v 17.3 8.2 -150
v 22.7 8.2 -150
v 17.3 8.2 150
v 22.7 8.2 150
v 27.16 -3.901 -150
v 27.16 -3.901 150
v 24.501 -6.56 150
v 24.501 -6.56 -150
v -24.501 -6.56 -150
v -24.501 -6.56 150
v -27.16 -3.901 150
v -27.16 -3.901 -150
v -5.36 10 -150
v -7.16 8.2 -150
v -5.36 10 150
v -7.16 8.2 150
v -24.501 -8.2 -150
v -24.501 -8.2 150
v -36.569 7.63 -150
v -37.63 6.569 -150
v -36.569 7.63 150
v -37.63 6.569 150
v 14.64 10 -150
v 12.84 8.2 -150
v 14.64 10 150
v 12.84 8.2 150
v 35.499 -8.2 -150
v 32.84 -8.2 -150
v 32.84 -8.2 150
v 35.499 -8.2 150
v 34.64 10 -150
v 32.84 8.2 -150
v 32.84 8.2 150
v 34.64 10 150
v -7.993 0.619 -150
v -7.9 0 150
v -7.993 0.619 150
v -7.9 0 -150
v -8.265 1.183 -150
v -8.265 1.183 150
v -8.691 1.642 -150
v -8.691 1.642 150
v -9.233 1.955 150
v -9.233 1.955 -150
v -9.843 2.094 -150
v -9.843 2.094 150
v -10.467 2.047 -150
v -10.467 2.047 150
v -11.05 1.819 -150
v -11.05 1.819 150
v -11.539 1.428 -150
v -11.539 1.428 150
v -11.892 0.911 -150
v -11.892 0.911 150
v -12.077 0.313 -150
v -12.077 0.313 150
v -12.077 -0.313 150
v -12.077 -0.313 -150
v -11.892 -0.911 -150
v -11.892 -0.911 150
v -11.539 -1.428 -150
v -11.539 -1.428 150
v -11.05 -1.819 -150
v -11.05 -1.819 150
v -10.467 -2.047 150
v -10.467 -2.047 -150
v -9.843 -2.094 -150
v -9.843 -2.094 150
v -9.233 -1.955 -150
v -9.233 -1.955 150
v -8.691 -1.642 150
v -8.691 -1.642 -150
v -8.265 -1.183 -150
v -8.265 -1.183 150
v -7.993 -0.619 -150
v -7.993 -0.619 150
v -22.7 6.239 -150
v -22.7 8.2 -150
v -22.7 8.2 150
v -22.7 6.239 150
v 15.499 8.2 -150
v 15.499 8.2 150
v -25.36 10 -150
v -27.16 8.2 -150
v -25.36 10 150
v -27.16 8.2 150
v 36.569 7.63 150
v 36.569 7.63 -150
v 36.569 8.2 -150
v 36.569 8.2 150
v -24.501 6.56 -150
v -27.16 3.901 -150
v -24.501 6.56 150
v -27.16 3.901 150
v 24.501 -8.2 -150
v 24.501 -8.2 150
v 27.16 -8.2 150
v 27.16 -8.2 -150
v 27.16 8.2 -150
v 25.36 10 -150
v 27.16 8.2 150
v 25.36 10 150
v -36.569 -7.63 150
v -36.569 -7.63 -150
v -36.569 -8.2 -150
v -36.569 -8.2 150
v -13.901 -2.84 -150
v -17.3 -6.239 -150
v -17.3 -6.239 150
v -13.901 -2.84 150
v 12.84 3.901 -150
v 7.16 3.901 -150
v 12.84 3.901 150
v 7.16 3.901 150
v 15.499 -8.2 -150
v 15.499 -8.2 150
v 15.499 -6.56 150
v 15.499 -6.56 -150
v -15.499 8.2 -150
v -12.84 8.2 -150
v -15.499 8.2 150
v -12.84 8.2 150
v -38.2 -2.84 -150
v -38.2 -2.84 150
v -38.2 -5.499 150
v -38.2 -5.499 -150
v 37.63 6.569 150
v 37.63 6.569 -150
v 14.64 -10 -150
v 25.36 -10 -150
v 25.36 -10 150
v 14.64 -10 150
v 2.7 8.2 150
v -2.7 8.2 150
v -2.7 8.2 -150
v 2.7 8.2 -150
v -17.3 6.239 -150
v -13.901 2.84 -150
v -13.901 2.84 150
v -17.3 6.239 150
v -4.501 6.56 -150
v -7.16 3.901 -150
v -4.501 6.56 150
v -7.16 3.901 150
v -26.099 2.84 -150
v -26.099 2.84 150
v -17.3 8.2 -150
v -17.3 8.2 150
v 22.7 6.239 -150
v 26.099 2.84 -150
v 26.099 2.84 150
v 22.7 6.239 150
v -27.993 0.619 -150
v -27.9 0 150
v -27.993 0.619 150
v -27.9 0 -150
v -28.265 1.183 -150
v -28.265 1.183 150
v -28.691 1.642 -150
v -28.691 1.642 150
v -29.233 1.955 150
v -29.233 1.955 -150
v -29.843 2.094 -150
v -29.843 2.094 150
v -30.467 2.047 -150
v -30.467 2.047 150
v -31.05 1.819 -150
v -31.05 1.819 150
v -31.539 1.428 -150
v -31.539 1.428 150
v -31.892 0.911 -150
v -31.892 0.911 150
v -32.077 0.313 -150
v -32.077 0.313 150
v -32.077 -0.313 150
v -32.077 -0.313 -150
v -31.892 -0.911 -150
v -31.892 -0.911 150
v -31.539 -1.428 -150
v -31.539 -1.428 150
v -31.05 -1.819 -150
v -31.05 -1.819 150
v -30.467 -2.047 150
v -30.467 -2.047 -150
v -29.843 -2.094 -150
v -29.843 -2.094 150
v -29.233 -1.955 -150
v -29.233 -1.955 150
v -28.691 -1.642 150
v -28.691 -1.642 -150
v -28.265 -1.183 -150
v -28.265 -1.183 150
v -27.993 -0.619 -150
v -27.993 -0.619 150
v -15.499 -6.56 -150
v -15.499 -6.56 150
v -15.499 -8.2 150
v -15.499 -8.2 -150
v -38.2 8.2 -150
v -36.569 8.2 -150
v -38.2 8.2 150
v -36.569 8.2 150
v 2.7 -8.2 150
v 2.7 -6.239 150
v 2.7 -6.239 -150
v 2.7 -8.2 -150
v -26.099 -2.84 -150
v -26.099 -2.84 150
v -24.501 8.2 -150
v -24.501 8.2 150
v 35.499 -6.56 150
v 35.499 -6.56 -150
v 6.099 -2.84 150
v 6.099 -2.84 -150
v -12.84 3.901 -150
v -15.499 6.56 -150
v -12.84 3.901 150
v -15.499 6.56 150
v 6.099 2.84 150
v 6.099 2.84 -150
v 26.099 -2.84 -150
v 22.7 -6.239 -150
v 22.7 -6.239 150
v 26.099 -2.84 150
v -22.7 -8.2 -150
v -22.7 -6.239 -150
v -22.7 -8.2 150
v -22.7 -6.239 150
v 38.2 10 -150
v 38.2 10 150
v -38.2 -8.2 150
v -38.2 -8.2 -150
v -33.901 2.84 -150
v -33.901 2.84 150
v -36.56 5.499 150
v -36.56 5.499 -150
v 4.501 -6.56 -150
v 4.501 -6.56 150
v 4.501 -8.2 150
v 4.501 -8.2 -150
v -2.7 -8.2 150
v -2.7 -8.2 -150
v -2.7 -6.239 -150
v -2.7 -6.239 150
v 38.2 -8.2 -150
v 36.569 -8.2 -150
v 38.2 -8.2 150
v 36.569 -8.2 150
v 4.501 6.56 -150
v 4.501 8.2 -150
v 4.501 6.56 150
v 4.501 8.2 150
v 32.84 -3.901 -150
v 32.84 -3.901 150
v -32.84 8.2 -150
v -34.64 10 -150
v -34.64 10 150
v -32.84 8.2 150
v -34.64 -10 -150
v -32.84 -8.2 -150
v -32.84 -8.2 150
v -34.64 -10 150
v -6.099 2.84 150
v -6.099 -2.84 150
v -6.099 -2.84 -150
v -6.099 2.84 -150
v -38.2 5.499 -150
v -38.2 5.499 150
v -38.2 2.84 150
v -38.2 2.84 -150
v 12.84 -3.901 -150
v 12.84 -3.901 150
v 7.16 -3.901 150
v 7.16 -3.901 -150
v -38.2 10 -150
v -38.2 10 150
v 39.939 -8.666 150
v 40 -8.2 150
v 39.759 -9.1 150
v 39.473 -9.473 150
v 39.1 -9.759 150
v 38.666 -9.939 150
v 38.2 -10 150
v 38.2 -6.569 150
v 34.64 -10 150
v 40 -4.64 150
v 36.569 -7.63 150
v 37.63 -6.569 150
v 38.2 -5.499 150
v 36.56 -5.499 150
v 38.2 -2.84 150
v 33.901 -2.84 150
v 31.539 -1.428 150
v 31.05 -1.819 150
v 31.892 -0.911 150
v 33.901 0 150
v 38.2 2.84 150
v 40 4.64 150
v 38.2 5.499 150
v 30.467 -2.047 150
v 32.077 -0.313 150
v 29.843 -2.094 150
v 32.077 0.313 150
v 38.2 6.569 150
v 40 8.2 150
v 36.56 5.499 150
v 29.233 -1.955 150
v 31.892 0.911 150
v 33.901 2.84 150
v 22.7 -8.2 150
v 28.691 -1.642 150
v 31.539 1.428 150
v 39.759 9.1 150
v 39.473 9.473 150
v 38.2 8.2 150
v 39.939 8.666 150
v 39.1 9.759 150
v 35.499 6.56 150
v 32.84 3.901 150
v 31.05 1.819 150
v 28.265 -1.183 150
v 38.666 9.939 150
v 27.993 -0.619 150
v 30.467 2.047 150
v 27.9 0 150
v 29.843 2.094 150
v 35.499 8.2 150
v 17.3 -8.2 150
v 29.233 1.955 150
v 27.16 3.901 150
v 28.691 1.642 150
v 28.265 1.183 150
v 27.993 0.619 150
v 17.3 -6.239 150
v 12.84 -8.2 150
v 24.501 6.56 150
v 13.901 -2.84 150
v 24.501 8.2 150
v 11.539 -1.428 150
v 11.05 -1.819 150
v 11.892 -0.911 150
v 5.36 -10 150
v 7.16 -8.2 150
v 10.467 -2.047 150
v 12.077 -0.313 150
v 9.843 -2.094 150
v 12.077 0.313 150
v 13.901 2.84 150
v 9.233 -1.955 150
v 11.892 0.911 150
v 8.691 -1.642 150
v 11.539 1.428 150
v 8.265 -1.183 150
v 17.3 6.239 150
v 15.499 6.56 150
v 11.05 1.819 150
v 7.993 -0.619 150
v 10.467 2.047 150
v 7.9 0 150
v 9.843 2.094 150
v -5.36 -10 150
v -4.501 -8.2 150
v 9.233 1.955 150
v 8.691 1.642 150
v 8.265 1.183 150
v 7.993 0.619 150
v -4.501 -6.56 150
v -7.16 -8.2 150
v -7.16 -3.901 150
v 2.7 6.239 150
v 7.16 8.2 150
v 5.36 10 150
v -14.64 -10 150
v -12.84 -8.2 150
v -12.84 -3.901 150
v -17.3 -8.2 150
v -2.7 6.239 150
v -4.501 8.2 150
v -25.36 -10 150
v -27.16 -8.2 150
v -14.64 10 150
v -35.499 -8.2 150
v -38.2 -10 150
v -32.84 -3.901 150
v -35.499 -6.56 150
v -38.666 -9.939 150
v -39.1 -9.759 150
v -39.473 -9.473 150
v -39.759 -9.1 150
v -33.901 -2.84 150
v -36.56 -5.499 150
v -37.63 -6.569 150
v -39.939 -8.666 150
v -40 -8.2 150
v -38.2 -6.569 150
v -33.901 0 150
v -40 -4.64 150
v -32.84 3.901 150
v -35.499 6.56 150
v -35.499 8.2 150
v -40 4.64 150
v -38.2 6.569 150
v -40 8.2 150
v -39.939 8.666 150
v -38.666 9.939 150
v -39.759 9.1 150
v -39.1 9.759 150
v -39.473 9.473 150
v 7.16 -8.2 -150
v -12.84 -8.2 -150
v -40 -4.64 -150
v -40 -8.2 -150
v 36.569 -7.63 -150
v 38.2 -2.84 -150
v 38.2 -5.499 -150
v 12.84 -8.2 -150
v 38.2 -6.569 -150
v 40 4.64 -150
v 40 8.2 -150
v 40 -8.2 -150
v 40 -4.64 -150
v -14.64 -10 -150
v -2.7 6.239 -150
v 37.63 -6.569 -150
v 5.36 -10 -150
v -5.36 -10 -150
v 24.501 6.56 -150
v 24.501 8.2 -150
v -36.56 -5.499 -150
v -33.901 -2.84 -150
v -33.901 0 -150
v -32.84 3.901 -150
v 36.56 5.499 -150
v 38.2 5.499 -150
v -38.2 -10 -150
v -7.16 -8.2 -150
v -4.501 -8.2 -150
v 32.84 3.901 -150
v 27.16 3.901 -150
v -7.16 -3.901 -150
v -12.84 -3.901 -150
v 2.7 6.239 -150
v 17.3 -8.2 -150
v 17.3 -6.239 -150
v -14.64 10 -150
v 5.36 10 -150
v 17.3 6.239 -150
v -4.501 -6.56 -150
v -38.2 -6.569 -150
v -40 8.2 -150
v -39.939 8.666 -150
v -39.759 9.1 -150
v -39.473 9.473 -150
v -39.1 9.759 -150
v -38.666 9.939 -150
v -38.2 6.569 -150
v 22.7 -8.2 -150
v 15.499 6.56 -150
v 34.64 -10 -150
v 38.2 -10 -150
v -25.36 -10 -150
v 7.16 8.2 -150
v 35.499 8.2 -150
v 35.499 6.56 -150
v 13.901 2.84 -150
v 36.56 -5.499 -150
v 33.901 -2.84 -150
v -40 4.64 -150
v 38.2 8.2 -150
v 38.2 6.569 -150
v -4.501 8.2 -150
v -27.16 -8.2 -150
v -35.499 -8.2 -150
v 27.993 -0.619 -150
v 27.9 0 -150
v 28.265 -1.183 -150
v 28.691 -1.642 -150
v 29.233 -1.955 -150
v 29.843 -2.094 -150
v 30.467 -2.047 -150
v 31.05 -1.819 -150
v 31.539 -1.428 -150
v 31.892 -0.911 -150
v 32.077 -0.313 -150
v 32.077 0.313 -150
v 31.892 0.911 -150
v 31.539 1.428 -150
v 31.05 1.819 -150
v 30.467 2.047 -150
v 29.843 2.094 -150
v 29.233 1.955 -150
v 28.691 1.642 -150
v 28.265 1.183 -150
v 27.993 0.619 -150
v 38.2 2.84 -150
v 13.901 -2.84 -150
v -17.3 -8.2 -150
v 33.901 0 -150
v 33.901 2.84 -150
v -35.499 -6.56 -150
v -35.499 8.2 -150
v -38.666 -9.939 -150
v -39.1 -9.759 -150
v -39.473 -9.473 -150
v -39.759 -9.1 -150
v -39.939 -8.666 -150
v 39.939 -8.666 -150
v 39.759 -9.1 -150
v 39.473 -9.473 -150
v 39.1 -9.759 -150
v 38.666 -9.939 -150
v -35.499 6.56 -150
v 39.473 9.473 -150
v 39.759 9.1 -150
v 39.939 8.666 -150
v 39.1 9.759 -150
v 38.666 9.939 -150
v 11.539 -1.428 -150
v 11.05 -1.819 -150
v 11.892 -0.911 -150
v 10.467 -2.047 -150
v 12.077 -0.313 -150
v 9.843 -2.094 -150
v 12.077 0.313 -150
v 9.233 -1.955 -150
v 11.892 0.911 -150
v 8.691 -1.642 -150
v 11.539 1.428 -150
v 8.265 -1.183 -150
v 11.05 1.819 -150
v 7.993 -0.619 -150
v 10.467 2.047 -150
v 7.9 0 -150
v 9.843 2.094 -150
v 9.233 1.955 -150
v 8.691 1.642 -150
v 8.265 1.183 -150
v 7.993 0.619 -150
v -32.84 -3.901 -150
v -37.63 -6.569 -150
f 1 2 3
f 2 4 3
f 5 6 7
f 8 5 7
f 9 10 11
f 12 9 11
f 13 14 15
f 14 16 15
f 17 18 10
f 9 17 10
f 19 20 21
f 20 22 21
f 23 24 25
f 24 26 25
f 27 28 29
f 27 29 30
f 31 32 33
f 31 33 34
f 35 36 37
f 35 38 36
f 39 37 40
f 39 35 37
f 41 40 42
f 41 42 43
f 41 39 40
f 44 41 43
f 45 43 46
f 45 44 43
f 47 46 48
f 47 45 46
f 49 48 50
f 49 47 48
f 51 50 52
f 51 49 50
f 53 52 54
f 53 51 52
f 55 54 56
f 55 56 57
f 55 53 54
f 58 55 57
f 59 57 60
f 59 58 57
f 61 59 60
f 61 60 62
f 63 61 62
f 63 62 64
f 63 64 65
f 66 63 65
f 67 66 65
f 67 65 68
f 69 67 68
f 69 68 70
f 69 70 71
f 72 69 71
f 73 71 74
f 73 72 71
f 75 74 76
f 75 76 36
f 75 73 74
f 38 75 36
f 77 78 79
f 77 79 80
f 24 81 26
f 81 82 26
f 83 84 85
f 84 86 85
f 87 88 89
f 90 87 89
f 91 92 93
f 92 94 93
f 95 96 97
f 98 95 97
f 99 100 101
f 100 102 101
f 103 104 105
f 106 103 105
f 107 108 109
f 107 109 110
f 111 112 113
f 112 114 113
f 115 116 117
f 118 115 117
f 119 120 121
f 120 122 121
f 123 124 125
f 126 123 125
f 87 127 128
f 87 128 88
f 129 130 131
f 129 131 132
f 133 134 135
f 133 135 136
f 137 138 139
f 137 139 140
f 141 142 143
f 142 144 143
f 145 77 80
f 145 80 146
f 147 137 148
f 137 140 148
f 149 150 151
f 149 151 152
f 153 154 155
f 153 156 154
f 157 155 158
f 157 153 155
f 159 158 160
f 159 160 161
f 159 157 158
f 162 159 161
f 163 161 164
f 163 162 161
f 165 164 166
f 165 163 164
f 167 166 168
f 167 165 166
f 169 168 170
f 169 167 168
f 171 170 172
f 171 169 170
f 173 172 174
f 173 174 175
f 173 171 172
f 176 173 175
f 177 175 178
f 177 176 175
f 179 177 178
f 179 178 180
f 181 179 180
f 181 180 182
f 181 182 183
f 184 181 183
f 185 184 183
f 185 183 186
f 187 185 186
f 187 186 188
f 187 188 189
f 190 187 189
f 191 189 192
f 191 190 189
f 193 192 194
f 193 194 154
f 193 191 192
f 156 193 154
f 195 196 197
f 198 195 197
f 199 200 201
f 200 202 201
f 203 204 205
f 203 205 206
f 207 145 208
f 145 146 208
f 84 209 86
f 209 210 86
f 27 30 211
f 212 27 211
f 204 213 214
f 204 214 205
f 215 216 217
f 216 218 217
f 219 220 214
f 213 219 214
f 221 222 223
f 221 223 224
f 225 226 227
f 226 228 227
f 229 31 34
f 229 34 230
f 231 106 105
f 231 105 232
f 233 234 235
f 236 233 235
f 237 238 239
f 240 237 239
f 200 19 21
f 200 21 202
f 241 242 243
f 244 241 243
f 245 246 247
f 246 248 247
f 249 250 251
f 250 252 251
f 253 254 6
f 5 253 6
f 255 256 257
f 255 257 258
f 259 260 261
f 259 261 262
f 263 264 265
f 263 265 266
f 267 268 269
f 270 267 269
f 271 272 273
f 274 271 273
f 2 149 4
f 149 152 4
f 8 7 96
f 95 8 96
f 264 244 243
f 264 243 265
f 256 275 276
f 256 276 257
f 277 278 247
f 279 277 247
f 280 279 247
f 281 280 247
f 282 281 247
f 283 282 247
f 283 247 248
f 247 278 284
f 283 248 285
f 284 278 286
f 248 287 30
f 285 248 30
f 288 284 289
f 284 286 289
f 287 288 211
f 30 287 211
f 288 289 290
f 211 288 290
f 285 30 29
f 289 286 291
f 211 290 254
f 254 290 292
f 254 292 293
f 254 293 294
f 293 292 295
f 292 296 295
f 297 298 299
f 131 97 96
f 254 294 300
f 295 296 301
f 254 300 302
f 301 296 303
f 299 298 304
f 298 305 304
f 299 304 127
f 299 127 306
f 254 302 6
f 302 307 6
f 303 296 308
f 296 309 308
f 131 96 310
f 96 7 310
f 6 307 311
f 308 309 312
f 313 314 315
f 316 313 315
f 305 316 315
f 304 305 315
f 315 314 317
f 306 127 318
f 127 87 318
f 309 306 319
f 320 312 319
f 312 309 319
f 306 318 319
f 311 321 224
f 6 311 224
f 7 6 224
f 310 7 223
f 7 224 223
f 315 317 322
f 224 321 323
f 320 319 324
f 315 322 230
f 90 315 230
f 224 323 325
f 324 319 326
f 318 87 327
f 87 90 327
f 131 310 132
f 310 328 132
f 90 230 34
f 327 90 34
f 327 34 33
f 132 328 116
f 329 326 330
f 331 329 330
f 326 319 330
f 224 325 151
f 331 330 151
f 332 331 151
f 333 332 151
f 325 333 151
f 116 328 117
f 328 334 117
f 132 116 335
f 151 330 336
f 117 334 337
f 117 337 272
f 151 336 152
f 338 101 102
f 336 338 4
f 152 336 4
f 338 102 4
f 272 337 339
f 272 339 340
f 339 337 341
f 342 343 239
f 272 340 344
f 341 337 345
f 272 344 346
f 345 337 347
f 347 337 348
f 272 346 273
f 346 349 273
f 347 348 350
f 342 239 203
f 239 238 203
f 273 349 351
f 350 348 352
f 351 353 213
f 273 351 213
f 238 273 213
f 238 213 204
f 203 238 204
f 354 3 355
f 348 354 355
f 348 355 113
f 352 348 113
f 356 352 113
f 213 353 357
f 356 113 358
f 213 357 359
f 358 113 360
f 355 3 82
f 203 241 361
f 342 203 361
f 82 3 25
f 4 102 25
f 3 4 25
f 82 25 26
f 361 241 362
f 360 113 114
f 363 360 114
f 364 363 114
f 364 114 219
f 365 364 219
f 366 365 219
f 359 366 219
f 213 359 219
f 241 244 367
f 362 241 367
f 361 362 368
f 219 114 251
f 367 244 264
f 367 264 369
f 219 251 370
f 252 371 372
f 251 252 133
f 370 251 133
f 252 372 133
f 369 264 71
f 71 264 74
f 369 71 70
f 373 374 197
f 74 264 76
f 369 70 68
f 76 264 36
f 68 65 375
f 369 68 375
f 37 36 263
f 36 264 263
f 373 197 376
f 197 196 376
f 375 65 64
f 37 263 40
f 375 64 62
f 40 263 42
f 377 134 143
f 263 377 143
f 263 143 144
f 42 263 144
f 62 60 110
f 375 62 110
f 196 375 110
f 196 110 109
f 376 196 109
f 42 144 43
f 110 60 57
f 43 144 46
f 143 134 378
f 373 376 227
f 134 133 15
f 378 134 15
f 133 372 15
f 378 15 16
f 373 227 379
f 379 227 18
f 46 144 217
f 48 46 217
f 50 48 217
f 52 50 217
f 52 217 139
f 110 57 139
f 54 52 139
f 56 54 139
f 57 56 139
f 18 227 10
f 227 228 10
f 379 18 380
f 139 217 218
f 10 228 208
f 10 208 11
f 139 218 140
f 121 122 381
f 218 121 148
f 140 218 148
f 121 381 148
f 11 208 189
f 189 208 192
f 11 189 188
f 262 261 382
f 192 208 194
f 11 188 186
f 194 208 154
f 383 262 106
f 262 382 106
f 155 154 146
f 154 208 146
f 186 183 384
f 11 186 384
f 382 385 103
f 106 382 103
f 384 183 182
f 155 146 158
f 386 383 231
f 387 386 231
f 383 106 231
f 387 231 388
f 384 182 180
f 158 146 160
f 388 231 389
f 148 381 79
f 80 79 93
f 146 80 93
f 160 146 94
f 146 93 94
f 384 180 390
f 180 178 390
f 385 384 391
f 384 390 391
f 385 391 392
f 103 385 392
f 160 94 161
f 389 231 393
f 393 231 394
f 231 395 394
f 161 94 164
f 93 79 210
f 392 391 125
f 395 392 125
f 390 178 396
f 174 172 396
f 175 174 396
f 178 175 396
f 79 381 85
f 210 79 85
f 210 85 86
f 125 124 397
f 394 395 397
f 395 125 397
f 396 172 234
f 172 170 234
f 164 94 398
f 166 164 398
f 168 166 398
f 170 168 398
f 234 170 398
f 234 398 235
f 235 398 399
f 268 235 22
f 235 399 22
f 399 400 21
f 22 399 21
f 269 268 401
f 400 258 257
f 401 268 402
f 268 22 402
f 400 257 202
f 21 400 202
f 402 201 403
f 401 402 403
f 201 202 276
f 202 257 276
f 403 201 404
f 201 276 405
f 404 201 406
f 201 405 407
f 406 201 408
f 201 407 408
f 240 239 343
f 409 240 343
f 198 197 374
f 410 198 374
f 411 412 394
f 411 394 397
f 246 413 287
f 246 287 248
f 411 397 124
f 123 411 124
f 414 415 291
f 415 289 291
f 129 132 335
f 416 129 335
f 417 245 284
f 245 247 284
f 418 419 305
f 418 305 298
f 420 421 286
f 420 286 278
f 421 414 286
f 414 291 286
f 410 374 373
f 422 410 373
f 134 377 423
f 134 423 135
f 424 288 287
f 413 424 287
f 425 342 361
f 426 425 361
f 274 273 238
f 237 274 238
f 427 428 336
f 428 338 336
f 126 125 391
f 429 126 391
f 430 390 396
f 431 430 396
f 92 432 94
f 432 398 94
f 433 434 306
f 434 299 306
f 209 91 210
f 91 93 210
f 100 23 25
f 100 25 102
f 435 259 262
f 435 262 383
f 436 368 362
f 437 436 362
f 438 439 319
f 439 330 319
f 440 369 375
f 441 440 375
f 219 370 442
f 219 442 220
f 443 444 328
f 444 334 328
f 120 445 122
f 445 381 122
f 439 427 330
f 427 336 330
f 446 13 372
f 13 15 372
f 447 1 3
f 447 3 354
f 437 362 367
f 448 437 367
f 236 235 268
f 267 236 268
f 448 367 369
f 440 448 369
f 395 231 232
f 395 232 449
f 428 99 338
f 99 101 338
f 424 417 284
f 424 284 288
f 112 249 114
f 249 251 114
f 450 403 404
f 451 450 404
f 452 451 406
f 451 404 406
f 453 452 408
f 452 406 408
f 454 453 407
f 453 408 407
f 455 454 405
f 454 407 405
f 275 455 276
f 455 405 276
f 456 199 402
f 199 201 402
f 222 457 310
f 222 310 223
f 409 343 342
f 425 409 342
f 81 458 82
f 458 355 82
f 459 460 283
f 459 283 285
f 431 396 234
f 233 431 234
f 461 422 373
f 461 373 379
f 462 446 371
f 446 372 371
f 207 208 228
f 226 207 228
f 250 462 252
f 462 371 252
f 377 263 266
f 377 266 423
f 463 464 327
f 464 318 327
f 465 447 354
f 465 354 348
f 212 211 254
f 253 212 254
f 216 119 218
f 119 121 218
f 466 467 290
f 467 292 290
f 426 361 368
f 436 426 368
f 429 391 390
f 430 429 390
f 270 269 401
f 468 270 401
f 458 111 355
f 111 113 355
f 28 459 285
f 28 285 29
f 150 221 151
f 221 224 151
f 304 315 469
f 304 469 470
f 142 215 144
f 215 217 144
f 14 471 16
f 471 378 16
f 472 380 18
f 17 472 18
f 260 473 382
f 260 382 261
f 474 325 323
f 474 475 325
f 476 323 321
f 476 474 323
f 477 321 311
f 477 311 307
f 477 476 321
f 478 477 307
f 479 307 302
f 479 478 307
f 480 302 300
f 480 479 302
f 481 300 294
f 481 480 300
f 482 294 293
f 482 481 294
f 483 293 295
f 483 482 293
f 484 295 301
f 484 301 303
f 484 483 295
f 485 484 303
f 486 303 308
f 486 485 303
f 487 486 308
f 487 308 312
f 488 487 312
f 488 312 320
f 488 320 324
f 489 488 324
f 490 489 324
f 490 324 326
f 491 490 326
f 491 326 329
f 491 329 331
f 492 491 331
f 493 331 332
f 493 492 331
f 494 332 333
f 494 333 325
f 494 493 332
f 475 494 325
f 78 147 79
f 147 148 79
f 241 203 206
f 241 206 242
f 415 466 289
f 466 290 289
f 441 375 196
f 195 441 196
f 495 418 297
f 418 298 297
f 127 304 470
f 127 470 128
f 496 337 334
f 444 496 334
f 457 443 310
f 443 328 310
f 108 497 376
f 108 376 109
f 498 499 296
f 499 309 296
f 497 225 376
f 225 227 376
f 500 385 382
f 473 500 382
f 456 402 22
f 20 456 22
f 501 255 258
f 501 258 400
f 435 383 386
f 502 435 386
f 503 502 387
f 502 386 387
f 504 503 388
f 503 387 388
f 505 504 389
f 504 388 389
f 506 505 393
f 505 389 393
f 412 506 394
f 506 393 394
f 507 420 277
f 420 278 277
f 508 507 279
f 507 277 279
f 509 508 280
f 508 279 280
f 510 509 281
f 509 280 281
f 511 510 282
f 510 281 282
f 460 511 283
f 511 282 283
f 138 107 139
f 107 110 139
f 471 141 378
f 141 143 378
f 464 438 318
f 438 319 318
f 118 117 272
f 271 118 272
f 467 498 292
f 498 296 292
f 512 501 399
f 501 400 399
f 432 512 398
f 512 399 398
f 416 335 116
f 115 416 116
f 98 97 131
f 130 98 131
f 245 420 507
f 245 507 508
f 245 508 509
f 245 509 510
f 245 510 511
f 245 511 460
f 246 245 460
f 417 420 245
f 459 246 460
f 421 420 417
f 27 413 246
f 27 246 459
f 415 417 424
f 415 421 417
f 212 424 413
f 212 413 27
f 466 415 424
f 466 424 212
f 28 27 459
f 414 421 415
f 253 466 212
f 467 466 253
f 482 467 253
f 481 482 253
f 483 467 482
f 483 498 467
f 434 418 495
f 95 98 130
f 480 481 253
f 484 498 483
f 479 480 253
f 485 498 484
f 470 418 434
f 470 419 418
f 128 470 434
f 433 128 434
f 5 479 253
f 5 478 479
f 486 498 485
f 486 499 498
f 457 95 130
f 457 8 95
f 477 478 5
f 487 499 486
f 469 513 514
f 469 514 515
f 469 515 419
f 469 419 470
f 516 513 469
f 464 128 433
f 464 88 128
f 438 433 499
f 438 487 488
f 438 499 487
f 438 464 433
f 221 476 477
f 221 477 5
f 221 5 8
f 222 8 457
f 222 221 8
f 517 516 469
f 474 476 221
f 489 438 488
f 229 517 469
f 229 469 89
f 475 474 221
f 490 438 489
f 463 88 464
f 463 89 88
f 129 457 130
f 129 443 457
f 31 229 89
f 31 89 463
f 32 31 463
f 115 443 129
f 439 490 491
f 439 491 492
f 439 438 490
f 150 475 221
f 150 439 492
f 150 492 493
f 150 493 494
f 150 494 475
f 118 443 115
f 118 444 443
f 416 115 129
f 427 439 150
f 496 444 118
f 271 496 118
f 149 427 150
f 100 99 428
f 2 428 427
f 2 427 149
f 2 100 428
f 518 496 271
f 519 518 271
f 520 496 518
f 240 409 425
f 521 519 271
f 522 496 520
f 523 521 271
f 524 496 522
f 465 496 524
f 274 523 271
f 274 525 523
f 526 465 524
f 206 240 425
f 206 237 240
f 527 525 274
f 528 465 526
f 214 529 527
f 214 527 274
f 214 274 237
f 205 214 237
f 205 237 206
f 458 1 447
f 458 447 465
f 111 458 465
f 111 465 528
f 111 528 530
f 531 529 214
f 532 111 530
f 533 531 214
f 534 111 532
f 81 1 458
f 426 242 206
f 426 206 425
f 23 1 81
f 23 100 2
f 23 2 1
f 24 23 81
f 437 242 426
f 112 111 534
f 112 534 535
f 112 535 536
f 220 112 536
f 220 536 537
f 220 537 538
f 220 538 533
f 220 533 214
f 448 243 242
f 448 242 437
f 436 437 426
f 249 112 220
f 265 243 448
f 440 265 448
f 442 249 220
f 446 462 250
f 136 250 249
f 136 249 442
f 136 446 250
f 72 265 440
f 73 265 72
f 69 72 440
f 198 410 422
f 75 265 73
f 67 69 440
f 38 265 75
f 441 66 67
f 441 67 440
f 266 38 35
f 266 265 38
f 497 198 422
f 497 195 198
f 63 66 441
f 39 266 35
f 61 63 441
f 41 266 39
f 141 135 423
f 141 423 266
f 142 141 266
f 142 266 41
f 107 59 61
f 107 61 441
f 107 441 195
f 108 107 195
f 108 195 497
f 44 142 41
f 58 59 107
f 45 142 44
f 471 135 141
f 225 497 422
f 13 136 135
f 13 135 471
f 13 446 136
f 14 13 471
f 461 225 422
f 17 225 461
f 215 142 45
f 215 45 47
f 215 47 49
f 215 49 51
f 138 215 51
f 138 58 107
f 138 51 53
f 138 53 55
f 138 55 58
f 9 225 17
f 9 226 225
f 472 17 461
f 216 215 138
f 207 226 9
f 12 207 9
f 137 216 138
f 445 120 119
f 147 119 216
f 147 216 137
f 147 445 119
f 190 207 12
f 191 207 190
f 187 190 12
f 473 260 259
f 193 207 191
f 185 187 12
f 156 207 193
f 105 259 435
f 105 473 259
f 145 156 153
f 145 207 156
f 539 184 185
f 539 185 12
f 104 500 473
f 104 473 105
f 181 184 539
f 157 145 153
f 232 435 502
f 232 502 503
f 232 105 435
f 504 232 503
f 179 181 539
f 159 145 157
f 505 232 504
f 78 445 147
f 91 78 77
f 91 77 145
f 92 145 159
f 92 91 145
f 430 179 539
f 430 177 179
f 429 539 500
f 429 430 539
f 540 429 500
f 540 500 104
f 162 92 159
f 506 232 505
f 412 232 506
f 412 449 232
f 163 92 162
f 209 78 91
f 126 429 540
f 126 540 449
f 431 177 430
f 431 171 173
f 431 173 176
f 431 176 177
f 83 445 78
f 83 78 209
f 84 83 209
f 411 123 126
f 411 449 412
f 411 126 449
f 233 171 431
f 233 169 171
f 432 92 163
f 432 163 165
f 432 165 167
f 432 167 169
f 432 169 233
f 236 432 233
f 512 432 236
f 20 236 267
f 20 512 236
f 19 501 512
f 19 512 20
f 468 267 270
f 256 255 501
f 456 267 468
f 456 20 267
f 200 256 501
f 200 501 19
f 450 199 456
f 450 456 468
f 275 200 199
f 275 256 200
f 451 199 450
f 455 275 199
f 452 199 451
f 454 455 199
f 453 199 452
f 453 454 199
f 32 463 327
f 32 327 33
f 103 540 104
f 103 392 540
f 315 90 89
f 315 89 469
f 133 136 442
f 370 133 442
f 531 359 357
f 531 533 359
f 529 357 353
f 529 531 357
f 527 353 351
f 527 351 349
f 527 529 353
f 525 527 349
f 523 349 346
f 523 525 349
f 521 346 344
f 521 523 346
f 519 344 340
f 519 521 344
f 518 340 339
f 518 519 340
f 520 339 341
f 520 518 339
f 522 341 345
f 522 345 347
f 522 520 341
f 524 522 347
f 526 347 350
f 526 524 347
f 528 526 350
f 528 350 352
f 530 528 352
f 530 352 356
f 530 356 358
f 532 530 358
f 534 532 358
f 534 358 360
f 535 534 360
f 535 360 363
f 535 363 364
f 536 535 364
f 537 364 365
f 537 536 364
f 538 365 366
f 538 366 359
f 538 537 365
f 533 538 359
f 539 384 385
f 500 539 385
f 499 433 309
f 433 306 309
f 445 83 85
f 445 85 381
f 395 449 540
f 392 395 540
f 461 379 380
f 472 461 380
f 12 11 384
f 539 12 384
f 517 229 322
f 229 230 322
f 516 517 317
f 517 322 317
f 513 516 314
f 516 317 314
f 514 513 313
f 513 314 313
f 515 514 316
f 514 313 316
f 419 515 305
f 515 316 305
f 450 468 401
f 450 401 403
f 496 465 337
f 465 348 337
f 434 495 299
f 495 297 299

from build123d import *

# Parameters (mm, degrees)
ESQUISSE1_R        = 2.1
BOSS_EXTRU_1_DEPTH = 150


with BuildPart() as part:
    # Esquisse1 → Boss.-Extru.1 (new, symmetric)
    with BuildSketch(Plane.XY):
        with BuildLine():
            Line((-38.199999929, 10), (-34.639999675, 10))
            Line((-34.639999675, 10), (-32.839999603, 8.2))
            Line((-32.839999603, 8.2), (-35.499339671, 8.2))
            Line((-35.499339671, 8.2), (-35.499339671, 6.56))
            Line((-35.499339671, 6.56), (-32.839999603, 3.900660038))
            Line((-32.839999603, 3.900660038), (-27.159999603, 3.900660038))
            Line((-27.159999603, 3.900660038), (-24.500659536, 6.56))
            Line((-24.500659536, 6.56), (-24.500659536, 8.2))
            Line((-24.500659536, 8.2), (-27.159999603, 8.2))
            Line((-27.159999603, 8.2), (-25.359999532, 10))
            Line((-25.359999532, 10), (-14.640000468, 10))
            Line((-14.640000468, 10), (-12.840000397, 8.2))
            Line((-12.840000397, 8.2), (-15.499340464, 8.2))
            Line((-15.499340464, 8.2), (-15.499340464, 6.56))
            Line((-15.499340464, 6.56), (-12.840000397, 3.900660038))
            Line((-12.840000397, 3.900660038), (-7.159998809, 3.900660038))
            Line((-7.159998809, 3.900660038), (-4.500658742, 6.56))
            Line((-4.500658742, 6.56), (-4.500658742, 8.2))
            Line((-4.500658742, 8.2), (-7.159998809, 8.2))
            Line((-7.159998809, 8.2), (-5.359998738, 10))
            Line((-5.359998738, 10), (5.359998738, 10))
            Line((5.359998738, 10), (7.159998809, 8.2))
            Line((7.159998809, 8.2), (4.500658742, 8.2))
            Line((4.500658742, 8.2), (4.500658742, 6.56))
            Line((4.500658742, 6.56), (7.159998809, 3.900660038))
            Line((7.159998809, 3.900660038), (12.840000397, 3.900660038))
            Line((12.840000397, 3.900660038), (15.499340464, 6.56))
            Line((15.499340464, 6.56), (15.499340464, 8.2))
            Line((15.499340464, 8.2), (12.840000397, 8.2))
            Line((12.840000397, 8.2), (14.640000468, 10))
            Line((14.640000468, 10), (25.359999532, 10))
            Line((25.359999532, 10), (27.159999603, 8.2))
            Line((27.159999603, 8.2), (24.500659536, 8.2))
            Line((24.500659536, 8.2), (24.500659536, 6.56))
            Line((24.500659536, 6.56), (27.159999603, 3.900660038))
            Line((27.159999603, 3.900660038), (32.839999603, 3.900660038))
            Line((32.839999603, 3.900660038), (35.499339671, 6.56))
            Line((35.499339671, 6.56), (35.499339671, 8.2))
            Line((35.499339671, 8.2), (32.839999603, 8.2))
            Line((32.839999603, 8.2), (34.639999675, 10))
            Line((34.639999675, 10), (38.199999929, 10))
            ThreePointArc((38.199999929, 10), (39.47279216, 9.472792181), (39.999999929, 8.199999929))
            Line((39.999999929, 8.199999929), (39.999999787, 4.639999675))
            Line((39.999999787, 4.639999675), (38.199999716, 2.839999675))
            Line((38.199999716, 2.839999675), (38.199999821, 5.499339742))
            Line((38.199999821, 5.499339742), (36.559999821, 5.499339807))
            Line((36.559999821, 5.499339807), (33.900659754, 2.839999845))
            Line((33.900659754, 2.839999845), (33.900659641, 0))
            Line((33.900659641, 0), (33.900659754, -2.839999845))
            Line((33.900659754, -2.839999845), (36.559999821, -5.499339807))
            Line((36.559999821, -5.499339807), (38.199999821, -5.499339742))
            Line((38.199999821, -5.499339742), (38.199999716, -2.839999675))
            Line((38.199999716, -2.839999675), (39.999999787, -4.639999675))
            Line((39.999999787, -4.639999675), (39.999999929, -8.199999929))
            ThreePointArc((39.999999929, -8.199999929), (39.47279216, -9.472792181), (38.199999929, -10))
            Line((38.199999929, -10), (34.639999675, -10))
            Line((34.639999675, -10), (32.839999603, -8.2))
            Line((32.839999603, -8.2), (35.499339671, -8.2))
            Line((35.499339671, -8.2), (35.499339671, -6.56))
            Line((35.499339671, -6.56), (32.839999603, -3.900660038))
            Line((32.839999603, -3.900660038), (27.159999603, -3.900660038))
            Line((27.159999603, -3.900660038), (24.500659536, -6.56))
            Line((24.500659536, -6.56), (24.500659536, -8.2))
            Line((24.500659536, -8.2), (27.159999603, -8.2))
            Line((27.159999603, -8.2), (25.359999532, -10))
            Line((25.359999532, -10), (14.640000468, -10))
            Line((14.640000468, -10), (12.840000397, -8.2))
            Line((12.840000397, -8.2), (15.499340464, -8.2))
            Line((15.499340464, -8.2), (15.499340464, -6.56))
            Line((15.499340464, -6.56), (12.840000397, -3.900660038))
            Line((12.840000397, -3.900660038), (7.159998809, -3.900660038))
            Line((7.159998809, -3.900660038), (4.500658742, -6.56))
            Line((4.500658742, -6.56), (4.500658742, -8.2))
            Line((4.500658742, -8.2), (7.159998809, -8.2))
            Line((7.159998809, -8.2), (5.359998738, -10))
            Line((5.359998738, -10), (-5.359998738, -10))
            Line((-5.359998738, -10), (-7.159998809, -8.2))
            Line((-7.159998809, -8.2), (-4.500658742, -8.2))
            Line((-4.500658742, -8.2), (-4.500658742, -6.56))
            Line((-4.500658742, -6.56), (-7.159998809, -3.900660038))
            Line((-7.159998809, -3.900660038), (-12.840000397, -3.900660038))
            Line((-12.840000397, -3.900660038), (-15.499340464, -6.56))
            Line((-15.499340464, -6.56), (-15.499340464, -8.2))
            Line((-15.499340464, -8.2), (-12.840000397, -8.2))
            Line((-12.840000397, -8.2), (-14.640000468, -10))
            Line((-14.640000468, -10), (-25.359999532, -10))
            Line((-25.359999532, -10), (-27.159999603, -8.2))
            Line((-27.159999603, -8.2), (-24.500659536, -8.2))
            Line((-24.500659536, -8.2), (-24.500659536, -6.56))
            Line((-24.500659536, -6.56), (-27.159999603, -3.900660038))
            Line((-27.159999603, -3.900660038), (-32.839999603, -3.900660038))
            Line((-32.839999603, -3.900660038), (-35.499339671, -6.56))
            Line((-35.499339671, -6.56), (-35.499339671, -8.2))
            Line((-35.499339671, -8.2), (-32.839999603, -8.2))
            Line((-32.839999603, -8.2), (-34.639999675, -10))
            Line((-34.639999675, -10), (-38.199999929, -10))
            ThreePointArc((-38.199999929, -10), (-39.47279216, -9.472792181), (-39.999999929, -8.199999929))
            Line((-39.999999929, -8.199999929), (-39.999999787, -4.639999675))
            Line((-39.999999787, -4.639999675), (-38.199999716, -2.839999675))
            Line((-38.199999716, -2.839999675), (-38.199999821, -5.499339742))
            Line((-38.199999821, -5.499339742), (-36.559999821, -5.499339807))
            Line((-36.559999821, -5.499339807), (-33.900659754, -2.839999845))
            Line((-33.900659754, -2.839999845), (-33.900659641, 0))
            Line((-33.900659641, 0), (-33.900659754, 2.839999845))
            Line((-33.900659754, 2.839999845), (-36.559999821, 5.499339807))
            Line((-36.559999821, 5.499339807), (-38.199999821, 5.499339742))
            Line((-38.199999821, 5.499339742), (-38.199999716, 2.839999675))
            Line((-38.199999716, 2.839999675), (-39.999999787, 4.639999675))
            Line((-39.999999787, 4.639999675), (-39.999999929, 8.199999929))
            ThreePointArc((-39.999999929, 8.199999929), (-39.47279216, 9.472792181), (-38.199999929, 10))
        make_face()
        with Locations((-29.999999603, 0)):
            Circle(ESQUISSE1_R, mode=Mode.SUBTRACT)
        with Locations((-9.999999603, 0)):
            Circle(ESQUISSE1_R, mode=Mode.SUBTRACT)
        with Locations(Location((29.999999603, 0, 0), (0, 0, 180))):
            Circle(ESQUISSE1_R, mode=Mode.SUBTRACT)
        with Locations(Location((9.999999603, 0, 0), (0, 0, 180))):
            Circle(ESQUISSE1_R, mode=Mode.SUBTRACT)
        Polygon((-38.199999929, 8.2), (-38.199999864, 6.569339742), (-37.629999799, 6.569339742), (-36.569339648, 7.629999935), (-36.569339648, 8.2), align=None, mode=Mode.SUBTRACT)
        Polygon((-17.3, 6.239339079), (-17.3, 8.2), (-22.7, 8.2), (-22.7, 6.239339079), (-26.099339368, 2.839999845), (-26.099339368, -2.839999845), (-22.7, -6.239339079), (-22.7, -8.2), (-17.3, -8.2), (-17.3, -6.239339079), (-13.900660632, -2.839999845), (-13.900660632, 2.839999845), align=None, mode=Mode.SUBTRACT)
        Polygon((-6.099339678, -2.840000949), (-6.099339678, 2.840000949), (-2.700001413, 6.239339079), (-2.700001413, 8.2), (2.700001413, 8.2), (2.700001413, 6.239339079), (6.099339678, 2.840000949), (6.099339678, -2.840000949), (2.700001413, -6.239339079), (2.700001413, -8.2), (-2.700001413, -8.2), (-2.700001413, -6.239339079), align=None, mode=Mode.SUBTRACT)
        Polygon((-36.569339648, -7.629999935), (-36.569339648, -8.2), (-38.199999929, -8.2), (-38.199999864, -6.569339742), (-37.629999799, -6.569339742), align=None, mode=Mode.SUBTRACT)
        Polygon((36.569339648, 8.2), (38.199999929, 8.2), (38.199999864, 6.569339742), (37.629999799, 6.569339742), (36.569339648, 7.629999935), align=None, mode=Mode.SUBTRACT)
        Polygon((36.569339648, -8.2), (38.199999929, -8.2), (38.199999864, -6.569339742), (37.629999799, -6.569339742), (36.569339648, -7.629999935), align=None, mode=Mode.SUBTRACT)
        Polygon((13.900660632, -2.839999845), (17.3, -6.239339079), (17.3, -8.2), (22.7, -8.2), (22.7, -6.239339079), (26.099339368, -2.839999845), (26.099339368, 2.839999845), (22.7, 6.239339079), (22.7, 8.2), (17.3, 8.2), (17.3, 6.239339079), (13.900660632, 2.839999845), align=None, mode=Mode.SUBTRACT)
    extrude(amount=BOSS_EXTRU_1_DEPTH, both=True)


solid = part.part
